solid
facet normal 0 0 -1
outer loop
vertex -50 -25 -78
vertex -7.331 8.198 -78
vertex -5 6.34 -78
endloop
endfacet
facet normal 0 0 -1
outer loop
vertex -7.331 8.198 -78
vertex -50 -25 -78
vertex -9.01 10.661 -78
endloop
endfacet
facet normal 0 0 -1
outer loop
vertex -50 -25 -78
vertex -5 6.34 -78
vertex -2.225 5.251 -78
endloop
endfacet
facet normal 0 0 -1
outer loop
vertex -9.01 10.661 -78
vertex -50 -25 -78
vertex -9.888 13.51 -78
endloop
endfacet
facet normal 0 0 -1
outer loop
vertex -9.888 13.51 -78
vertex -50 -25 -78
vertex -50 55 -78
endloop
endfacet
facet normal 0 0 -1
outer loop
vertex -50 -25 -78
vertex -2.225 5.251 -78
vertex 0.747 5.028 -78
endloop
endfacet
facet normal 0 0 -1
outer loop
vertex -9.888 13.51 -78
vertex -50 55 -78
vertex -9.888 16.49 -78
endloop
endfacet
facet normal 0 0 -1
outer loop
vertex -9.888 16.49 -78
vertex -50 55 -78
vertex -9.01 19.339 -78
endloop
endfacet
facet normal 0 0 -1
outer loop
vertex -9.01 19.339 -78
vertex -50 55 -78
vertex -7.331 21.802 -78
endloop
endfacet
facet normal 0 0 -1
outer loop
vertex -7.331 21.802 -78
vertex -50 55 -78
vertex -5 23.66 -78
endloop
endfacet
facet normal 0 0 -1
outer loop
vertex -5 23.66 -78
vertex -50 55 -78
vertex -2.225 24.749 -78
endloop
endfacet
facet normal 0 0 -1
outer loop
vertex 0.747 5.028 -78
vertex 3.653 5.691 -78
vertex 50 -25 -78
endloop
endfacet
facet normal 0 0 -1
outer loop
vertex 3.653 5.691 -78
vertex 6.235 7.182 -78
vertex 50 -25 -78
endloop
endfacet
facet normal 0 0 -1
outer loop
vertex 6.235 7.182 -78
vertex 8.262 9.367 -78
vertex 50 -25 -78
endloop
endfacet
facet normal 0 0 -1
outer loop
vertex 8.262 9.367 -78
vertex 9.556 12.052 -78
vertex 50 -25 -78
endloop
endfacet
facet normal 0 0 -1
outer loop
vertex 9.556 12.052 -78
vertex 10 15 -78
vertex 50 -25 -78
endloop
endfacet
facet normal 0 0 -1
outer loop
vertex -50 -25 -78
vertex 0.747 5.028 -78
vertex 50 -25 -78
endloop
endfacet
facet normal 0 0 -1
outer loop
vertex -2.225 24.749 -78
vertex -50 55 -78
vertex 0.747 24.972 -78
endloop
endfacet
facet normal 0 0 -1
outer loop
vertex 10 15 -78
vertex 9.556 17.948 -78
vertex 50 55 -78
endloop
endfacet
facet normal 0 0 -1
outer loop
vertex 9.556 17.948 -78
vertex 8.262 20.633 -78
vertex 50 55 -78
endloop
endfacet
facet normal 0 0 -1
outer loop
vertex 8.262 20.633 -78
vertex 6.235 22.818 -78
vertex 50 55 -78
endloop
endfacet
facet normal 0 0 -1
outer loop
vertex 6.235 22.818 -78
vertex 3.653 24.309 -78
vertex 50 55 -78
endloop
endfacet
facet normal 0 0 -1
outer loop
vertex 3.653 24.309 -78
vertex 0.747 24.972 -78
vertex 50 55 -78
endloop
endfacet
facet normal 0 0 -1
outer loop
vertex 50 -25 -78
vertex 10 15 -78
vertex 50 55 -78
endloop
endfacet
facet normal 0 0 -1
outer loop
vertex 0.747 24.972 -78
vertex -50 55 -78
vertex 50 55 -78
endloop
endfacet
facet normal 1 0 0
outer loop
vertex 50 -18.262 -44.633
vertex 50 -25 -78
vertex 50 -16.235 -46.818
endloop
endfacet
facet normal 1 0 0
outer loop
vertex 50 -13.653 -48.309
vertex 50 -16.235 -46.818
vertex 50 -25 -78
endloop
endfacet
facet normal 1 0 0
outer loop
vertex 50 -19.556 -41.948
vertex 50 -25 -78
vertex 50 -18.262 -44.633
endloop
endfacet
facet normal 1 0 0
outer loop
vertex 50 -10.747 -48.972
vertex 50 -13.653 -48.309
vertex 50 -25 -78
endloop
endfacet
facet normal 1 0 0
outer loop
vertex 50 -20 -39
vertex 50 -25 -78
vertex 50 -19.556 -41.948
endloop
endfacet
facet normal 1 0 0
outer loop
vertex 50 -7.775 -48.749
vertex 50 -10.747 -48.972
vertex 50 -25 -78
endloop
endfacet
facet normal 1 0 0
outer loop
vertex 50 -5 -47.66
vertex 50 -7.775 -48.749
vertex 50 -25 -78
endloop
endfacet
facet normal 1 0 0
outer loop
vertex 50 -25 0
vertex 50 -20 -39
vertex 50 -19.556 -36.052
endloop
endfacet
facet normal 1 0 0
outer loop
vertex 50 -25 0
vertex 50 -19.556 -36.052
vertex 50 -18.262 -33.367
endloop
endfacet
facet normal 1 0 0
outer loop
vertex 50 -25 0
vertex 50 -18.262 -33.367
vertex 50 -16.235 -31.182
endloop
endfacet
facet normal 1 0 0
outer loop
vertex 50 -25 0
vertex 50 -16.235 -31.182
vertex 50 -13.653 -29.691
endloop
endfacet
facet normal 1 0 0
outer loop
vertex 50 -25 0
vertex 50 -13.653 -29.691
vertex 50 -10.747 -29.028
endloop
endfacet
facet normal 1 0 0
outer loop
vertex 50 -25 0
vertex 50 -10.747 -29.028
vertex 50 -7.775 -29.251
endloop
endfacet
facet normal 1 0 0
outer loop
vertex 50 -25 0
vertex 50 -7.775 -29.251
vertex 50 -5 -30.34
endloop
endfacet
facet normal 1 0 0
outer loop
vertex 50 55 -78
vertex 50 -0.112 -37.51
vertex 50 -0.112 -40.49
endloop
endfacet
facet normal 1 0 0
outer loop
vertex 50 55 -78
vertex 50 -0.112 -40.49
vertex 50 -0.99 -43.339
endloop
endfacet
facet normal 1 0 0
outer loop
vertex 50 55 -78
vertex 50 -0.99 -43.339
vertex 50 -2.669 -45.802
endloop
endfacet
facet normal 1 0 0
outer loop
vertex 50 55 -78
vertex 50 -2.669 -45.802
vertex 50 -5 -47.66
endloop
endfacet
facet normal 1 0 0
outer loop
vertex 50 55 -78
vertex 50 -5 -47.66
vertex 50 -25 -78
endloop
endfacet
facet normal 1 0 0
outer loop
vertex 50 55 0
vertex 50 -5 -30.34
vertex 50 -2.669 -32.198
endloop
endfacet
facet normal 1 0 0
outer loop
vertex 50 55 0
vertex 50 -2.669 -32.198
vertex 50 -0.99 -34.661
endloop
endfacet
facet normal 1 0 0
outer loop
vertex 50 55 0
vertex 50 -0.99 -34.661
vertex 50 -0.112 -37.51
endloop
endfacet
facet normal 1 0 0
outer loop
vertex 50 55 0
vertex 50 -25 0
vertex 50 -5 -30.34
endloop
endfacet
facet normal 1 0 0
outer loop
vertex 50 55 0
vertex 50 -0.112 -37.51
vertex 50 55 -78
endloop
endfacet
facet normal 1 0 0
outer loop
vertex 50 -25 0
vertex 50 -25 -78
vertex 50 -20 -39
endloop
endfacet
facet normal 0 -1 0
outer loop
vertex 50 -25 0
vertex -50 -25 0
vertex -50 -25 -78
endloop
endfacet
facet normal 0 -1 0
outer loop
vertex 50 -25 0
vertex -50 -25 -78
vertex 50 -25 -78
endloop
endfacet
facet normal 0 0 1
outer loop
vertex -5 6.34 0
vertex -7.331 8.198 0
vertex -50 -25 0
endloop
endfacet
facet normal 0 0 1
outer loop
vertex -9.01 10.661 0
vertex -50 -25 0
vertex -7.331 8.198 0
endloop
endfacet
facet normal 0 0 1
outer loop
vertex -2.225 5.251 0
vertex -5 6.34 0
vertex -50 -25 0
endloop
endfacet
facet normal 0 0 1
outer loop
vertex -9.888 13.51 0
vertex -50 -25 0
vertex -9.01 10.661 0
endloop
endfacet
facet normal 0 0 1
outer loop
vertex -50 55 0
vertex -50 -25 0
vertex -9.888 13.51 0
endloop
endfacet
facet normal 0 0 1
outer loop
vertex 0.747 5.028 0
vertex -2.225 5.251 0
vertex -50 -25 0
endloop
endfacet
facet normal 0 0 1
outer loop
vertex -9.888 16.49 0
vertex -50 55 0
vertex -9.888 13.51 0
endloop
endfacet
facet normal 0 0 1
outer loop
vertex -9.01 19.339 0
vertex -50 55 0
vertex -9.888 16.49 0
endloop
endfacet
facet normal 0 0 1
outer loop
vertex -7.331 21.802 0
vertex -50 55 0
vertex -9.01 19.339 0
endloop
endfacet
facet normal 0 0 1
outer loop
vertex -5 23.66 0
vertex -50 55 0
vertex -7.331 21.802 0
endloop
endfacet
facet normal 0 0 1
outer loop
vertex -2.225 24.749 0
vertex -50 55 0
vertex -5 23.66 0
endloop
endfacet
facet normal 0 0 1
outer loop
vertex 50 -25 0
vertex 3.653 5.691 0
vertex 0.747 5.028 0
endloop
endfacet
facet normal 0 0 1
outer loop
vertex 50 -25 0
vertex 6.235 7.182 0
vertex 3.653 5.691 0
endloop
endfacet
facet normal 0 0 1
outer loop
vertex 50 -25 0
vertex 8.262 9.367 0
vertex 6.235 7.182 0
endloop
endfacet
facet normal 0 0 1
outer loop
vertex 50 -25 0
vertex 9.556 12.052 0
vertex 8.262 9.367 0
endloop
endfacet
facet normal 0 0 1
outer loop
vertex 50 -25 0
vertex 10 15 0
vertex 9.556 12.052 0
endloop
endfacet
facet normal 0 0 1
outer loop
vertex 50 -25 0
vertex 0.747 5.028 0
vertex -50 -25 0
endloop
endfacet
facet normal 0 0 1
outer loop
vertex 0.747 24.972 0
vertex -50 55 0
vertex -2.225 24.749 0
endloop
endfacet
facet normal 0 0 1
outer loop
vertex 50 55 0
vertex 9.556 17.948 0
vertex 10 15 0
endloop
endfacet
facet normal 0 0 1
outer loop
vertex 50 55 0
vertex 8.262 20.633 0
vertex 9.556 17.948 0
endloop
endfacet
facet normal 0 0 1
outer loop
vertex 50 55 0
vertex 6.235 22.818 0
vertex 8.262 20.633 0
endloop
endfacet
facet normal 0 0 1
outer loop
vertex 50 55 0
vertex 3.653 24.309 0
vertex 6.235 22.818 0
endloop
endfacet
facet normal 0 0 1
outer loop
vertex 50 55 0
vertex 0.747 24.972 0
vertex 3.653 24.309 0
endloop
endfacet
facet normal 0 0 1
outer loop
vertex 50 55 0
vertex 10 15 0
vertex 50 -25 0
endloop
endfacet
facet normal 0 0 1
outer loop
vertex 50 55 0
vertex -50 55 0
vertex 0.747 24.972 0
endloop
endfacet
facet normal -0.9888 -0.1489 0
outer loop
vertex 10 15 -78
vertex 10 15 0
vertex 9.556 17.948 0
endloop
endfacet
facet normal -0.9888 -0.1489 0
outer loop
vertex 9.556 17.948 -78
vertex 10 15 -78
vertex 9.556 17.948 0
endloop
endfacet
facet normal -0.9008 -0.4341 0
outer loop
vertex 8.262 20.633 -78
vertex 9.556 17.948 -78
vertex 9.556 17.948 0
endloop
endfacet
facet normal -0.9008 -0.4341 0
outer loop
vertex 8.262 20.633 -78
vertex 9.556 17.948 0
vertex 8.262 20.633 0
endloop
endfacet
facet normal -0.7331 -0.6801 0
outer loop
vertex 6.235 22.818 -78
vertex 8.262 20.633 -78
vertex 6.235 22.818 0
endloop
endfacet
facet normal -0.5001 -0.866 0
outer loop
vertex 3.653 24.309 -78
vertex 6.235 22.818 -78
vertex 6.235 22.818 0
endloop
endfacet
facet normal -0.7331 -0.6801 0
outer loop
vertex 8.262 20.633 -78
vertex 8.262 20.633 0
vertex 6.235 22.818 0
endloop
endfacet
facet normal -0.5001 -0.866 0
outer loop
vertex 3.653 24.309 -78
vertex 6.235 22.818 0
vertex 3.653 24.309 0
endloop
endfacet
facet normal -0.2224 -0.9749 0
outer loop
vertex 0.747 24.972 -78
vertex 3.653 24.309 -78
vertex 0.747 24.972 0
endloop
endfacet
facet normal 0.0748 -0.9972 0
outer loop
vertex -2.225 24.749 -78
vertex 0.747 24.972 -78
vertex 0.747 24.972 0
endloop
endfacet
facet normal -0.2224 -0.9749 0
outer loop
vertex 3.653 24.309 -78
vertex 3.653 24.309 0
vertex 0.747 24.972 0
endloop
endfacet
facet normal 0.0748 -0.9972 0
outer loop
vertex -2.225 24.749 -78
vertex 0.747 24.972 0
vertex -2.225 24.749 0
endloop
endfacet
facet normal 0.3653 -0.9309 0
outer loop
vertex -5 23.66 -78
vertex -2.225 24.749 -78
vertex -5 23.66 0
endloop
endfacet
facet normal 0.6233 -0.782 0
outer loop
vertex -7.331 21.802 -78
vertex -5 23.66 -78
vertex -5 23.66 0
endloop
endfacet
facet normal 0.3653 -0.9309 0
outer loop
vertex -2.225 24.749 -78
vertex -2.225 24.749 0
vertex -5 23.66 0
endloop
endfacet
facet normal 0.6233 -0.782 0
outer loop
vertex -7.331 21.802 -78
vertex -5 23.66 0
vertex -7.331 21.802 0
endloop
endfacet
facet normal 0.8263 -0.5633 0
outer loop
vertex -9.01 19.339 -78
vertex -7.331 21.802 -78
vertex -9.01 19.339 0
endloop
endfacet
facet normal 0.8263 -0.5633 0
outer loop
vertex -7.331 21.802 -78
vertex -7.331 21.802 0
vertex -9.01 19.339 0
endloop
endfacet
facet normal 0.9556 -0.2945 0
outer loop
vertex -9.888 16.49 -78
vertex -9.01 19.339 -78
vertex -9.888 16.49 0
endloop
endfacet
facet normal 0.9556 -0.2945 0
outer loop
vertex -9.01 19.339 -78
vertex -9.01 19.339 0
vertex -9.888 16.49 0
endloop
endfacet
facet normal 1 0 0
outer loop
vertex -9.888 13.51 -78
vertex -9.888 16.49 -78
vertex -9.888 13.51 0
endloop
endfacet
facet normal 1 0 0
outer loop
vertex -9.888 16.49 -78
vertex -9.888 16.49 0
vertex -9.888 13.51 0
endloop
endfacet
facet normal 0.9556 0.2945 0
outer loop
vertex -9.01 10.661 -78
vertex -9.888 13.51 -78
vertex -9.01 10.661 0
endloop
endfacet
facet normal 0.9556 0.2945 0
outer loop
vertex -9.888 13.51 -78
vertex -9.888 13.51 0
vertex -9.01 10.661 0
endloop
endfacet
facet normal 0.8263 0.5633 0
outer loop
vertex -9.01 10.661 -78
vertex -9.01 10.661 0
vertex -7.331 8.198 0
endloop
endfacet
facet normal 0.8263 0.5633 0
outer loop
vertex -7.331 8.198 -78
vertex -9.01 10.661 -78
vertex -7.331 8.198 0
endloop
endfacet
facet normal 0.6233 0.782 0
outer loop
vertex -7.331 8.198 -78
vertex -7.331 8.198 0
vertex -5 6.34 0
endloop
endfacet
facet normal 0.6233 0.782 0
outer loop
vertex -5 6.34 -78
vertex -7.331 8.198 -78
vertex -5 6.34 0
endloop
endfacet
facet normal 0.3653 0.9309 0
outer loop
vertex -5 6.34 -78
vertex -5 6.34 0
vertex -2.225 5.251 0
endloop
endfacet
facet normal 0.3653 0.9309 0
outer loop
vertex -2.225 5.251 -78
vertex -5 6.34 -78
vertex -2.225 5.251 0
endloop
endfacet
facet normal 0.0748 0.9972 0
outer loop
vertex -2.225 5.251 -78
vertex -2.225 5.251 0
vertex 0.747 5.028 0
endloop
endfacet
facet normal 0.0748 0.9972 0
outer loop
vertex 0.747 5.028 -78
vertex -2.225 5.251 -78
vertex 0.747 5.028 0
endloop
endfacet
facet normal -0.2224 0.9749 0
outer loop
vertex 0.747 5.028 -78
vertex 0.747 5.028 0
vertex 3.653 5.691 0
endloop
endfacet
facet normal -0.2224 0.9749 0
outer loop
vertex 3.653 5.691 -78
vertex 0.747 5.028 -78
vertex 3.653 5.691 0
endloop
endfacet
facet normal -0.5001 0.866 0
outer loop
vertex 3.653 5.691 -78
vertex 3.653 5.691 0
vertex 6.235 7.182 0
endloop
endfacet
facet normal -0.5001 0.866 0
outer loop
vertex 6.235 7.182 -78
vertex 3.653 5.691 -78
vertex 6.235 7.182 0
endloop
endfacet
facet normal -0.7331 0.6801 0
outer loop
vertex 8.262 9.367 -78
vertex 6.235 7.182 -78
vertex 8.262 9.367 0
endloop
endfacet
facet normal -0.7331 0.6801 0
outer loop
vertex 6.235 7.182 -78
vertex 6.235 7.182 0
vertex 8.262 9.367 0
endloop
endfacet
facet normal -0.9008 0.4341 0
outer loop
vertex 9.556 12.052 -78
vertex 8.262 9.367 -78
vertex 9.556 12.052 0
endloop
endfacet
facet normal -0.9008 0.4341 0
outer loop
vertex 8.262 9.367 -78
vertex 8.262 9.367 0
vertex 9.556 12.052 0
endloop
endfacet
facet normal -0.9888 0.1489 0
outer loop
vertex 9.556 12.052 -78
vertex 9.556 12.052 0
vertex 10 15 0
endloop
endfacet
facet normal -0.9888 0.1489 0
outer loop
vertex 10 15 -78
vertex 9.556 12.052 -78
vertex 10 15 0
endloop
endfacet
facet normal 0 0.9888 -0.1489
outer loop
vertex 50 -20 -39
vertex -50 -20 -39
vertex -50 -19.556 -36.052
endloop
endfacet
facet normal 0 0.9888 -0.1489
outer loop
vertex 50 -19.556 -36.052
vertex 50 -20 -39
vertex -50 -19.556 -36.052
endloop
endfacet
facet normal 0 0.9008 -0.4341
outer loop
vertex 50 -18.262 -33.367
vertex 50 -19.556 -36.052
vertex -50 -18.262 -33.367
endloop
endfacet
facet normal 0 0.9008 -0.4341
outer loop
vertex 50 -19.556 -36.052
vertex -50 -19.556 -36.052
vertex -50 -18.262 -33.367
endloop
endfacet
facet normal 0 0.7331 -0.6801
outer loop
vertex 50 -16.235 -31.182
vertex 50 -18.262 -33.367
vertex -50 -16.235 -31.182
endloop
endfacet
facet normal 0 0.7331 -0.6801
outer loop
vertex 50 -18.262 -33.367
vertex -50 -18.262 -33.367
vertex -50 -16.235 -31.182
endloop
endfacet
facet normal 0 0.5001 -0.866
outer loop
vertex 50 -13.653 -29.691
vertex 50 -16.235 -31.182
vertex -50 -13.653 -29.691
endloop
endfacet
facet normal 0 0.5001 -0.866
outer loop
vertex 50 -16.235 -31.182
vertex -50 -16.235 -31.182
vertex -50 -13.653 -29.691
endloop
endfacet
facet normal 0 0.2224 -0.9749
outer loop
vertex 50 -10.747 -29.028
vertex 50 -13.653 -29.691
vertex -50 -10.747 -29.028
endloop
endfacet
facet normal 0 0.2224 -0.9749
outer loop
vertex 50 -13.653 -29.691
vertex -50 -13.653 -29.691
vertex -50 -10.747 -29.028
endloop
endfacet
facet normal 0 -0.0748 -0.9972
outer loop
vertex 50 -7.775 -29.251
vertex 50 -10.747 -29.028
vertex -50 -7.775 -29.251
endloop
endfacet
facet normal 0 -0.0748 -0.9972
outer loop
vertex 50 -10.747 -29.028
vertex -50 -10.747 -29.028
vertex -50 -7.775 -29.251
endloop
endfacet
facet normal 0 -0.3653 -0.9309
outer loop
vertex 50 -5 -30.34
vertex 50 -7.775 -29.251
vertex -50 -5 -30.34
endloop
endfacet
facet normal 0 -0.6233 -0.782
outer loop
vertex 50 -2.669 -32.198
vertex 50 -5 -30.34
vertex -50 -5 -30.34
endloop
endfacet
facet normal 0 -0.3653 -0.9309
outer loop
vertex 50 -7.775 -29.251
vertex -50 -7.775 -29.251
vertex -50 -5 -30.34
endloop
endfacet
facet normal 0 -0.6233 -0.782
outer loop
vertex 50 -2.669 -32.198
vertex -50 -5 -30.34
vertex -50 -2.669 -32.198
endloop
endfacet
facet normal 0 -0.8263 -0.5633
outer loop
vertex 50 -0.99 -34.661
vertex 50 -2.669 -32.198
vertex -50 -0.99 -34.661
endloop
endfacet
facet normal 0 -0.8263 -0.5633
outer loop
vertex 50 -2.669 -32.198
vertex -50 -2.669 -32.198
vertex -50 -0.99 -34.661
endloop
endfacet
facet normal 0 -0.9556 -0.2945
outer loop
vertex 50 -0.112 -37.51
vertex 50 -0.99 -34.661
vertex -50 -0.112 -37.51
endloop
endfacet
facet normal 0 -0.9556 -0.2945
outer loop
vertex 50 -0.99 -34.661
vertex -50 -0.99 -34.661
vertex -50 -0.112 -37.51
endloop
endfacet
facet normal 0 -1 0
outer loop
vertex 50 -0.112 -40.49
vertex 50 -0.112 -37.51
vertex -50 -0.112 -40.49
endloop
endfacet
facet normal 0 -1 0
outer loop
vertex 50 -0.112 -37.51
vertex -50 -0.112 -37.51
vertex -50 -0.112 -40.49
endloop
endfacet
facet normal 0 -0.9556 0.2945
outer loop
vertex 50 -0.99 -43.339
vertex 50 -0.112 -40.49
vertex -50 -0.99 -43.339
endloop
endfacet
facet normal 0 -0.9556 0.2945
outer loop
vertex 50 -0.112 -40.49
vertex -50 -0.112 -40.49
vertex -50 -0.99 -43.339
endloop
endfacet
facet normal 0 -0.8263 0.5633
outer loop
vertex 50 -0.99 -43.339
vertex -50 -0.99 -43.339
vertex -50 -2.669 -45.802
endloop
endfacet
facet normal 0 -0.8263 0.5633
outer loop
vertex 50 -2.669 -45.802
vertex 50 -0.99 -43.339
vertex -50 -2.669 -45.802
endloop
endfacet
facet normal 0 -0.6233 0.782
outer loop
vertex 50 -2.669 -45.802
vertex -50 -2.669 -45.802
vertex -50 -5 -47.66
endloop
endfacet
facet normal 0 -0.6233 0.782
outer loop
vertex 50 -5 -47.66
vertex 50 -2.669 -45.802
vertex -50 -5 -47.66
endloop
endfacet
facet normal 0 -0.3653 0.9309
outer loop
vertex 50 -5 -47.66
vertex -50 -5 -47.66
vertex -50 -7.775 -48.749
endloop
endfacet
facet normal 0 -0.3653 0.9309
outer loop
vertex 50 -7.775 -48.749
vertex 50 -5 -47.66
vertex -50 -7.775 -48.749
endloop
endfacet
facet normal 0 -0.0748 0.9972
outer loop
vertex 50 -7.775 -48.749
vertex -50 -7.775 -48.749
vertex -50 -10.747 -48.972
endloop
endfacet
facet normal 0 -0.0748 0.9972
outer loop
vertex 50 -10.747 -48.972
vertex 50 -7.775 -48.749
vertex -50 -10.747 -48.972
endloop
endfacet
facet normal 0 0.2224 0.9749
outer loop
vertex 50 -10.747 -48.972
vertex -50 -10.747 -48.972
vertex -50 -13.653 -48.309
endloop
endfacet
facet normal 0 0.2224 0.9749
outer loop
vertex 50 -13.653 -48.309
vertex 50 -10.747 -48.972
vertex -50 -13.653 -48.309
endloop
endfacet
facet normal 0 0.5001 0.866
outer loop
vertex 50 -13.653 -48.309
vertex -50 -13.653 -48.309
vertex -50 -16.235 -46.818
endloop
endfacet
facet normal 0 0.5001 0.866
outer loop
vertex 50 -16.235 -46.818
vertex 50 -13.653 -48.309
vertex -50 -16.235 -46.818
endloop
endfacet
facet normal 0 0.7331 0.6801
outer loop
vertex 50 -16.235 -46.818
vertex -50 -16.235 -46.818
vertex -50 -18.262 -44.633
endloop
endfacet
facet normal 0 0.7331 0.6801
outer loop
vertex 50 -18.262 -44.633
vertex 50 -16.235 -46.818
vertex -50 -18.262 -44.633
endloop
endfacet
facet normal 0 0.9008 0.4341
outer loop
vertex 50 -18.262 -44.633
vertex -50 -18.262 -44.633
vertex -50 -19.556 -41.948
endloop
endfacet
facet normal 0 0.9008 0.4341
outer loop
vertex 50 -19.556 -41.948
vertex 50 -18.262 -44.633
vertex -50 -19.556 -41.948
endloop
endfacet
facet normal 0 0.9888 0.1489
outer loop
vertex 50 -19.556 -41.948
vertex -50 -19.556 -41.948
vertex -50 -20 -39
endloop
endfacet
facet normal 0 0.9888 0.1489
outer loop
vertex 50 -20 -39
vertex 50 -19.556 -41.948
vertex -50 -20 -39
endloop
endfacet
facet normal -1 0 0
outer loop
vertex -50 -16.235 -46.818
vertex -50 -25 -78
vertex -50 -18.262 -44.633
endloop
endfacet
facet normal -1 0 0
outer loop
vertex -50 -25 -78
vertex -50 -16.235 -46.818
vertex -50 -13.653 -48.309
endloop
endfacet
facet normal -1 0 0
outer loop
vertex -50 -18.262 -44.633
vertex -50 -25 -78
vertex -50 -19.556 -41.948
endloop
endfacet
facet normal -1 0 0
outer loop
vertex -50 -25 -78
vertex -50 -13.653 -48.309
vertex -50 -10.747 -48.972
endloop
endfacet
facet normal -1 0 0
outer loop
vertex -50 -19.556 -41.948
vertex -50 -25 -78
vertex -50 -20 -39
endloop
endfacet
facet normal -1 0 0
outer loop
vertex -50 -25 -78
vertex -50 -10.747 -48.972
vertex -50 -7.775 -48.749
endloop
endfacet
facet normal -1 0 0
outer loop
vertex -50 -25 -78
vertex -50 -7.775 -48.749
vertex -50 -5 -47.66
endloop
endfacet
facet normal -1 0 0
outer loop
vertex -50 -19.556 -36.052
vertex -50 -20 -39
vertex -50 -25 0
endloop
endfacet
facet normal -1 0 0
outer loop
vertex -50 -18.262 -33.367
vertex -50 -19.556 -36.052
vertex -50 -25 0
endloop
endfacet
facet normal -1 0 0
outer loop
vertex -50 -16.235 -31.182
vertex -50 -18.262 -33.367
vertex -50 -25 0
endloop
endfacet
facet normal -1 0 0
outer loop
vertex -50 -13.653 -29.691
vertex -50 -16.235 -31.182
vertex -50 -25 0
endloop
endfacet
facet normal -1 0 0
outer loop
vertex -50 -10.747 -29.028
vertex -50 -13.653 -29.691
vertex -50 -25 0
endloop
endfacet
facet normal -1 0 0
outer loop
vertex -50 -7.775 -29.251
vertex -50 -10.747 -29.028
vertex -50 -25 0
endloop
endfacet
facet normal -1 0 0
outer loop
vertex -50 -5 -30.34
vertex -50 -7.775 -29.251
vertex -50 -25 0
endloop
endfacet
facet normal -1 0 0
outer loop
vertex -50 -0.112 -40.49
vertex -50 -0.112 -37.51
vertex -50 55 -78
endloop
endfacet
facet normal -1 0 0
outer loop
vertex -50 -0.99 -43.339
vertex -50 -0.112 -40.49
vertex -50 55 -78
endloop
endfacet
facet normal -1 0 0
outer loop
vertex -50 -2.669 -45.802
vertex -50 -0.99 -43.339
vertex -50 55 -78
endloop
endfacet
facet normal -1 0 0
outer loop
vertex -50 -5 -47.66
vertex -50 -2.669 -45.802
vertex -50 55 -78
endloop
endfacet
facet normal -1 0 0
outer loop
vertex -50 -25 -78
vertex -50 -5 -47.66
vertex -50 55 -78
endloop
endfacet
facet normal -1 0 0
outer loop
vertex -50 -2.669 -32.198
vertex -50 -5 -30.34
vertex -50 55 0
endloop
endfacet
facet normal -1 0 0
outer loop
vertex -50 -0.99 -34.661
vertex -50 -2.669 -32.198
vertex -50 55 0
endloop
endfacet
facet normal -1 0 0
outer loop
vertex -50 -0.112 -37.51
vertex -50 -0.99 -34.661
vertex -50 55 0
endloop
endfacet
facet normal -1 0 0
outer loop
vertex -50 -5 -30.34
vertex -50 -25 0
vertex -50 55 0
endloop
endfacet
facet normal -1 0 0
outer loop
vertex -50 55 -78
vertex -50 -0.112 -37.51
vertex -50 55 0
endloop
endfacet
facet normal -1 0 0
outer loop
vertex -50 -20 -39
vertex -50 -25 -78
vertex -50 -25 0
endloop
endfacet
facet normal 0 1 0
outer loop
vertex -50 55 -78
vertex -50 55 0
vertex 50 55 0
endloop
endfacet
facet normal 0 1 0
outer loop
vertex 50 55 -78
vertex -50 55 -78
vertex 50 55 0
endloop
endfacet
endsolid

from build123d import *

# Parameters (mm, degrees)
SKETCH_1_W          = 100
SKETCH_1_H          = 80
SKETCH_1_R          = 10
EXTRUDE_1_DEPTH     = 78
CUT_EXTRUDE_1_REACH = 140.235
SKETCH_3_R          = 10


with BuildPart() as part:
    # Эскиз1 → Бобышка-Вытянуть1 (new body)
    with BuildSketch(Plane.XY):
        with Locations((0, 15)):
            Rectangle(SKETCH_1_W, SKETCH_1_H)
        with Locations((0, 15)):
            Circle(SKETCH_1_R, mode=Mode.SUBTRACT)
    extrude(amount=-EXTRUDE_1_DEPTH)

    # Эскиз3 → Вырез-Вытянуть1 (cut, up to next)
    with BuildSketch(Plane.ZY.offset(50), mode=Mode.PRIVATE) as cut_extrude_1_sk1:
        with Locations(Location((-39, -10, 0), (0, 0, 270))):
            Circle(SKETCH_3_R)
    cut_extrude_1_tool1 = extrude(cut_extrude_1_sk1.sketch, amount=-CUT_EXTRUDE_1_REACH, mode=Mode.PRIVATE) & part.part
    add(cut_extrude_1_tool1.solids().sort_by_distance((-50, -10, -39))[0], mode=Mode.SUBTRACT)


solid = part.part
